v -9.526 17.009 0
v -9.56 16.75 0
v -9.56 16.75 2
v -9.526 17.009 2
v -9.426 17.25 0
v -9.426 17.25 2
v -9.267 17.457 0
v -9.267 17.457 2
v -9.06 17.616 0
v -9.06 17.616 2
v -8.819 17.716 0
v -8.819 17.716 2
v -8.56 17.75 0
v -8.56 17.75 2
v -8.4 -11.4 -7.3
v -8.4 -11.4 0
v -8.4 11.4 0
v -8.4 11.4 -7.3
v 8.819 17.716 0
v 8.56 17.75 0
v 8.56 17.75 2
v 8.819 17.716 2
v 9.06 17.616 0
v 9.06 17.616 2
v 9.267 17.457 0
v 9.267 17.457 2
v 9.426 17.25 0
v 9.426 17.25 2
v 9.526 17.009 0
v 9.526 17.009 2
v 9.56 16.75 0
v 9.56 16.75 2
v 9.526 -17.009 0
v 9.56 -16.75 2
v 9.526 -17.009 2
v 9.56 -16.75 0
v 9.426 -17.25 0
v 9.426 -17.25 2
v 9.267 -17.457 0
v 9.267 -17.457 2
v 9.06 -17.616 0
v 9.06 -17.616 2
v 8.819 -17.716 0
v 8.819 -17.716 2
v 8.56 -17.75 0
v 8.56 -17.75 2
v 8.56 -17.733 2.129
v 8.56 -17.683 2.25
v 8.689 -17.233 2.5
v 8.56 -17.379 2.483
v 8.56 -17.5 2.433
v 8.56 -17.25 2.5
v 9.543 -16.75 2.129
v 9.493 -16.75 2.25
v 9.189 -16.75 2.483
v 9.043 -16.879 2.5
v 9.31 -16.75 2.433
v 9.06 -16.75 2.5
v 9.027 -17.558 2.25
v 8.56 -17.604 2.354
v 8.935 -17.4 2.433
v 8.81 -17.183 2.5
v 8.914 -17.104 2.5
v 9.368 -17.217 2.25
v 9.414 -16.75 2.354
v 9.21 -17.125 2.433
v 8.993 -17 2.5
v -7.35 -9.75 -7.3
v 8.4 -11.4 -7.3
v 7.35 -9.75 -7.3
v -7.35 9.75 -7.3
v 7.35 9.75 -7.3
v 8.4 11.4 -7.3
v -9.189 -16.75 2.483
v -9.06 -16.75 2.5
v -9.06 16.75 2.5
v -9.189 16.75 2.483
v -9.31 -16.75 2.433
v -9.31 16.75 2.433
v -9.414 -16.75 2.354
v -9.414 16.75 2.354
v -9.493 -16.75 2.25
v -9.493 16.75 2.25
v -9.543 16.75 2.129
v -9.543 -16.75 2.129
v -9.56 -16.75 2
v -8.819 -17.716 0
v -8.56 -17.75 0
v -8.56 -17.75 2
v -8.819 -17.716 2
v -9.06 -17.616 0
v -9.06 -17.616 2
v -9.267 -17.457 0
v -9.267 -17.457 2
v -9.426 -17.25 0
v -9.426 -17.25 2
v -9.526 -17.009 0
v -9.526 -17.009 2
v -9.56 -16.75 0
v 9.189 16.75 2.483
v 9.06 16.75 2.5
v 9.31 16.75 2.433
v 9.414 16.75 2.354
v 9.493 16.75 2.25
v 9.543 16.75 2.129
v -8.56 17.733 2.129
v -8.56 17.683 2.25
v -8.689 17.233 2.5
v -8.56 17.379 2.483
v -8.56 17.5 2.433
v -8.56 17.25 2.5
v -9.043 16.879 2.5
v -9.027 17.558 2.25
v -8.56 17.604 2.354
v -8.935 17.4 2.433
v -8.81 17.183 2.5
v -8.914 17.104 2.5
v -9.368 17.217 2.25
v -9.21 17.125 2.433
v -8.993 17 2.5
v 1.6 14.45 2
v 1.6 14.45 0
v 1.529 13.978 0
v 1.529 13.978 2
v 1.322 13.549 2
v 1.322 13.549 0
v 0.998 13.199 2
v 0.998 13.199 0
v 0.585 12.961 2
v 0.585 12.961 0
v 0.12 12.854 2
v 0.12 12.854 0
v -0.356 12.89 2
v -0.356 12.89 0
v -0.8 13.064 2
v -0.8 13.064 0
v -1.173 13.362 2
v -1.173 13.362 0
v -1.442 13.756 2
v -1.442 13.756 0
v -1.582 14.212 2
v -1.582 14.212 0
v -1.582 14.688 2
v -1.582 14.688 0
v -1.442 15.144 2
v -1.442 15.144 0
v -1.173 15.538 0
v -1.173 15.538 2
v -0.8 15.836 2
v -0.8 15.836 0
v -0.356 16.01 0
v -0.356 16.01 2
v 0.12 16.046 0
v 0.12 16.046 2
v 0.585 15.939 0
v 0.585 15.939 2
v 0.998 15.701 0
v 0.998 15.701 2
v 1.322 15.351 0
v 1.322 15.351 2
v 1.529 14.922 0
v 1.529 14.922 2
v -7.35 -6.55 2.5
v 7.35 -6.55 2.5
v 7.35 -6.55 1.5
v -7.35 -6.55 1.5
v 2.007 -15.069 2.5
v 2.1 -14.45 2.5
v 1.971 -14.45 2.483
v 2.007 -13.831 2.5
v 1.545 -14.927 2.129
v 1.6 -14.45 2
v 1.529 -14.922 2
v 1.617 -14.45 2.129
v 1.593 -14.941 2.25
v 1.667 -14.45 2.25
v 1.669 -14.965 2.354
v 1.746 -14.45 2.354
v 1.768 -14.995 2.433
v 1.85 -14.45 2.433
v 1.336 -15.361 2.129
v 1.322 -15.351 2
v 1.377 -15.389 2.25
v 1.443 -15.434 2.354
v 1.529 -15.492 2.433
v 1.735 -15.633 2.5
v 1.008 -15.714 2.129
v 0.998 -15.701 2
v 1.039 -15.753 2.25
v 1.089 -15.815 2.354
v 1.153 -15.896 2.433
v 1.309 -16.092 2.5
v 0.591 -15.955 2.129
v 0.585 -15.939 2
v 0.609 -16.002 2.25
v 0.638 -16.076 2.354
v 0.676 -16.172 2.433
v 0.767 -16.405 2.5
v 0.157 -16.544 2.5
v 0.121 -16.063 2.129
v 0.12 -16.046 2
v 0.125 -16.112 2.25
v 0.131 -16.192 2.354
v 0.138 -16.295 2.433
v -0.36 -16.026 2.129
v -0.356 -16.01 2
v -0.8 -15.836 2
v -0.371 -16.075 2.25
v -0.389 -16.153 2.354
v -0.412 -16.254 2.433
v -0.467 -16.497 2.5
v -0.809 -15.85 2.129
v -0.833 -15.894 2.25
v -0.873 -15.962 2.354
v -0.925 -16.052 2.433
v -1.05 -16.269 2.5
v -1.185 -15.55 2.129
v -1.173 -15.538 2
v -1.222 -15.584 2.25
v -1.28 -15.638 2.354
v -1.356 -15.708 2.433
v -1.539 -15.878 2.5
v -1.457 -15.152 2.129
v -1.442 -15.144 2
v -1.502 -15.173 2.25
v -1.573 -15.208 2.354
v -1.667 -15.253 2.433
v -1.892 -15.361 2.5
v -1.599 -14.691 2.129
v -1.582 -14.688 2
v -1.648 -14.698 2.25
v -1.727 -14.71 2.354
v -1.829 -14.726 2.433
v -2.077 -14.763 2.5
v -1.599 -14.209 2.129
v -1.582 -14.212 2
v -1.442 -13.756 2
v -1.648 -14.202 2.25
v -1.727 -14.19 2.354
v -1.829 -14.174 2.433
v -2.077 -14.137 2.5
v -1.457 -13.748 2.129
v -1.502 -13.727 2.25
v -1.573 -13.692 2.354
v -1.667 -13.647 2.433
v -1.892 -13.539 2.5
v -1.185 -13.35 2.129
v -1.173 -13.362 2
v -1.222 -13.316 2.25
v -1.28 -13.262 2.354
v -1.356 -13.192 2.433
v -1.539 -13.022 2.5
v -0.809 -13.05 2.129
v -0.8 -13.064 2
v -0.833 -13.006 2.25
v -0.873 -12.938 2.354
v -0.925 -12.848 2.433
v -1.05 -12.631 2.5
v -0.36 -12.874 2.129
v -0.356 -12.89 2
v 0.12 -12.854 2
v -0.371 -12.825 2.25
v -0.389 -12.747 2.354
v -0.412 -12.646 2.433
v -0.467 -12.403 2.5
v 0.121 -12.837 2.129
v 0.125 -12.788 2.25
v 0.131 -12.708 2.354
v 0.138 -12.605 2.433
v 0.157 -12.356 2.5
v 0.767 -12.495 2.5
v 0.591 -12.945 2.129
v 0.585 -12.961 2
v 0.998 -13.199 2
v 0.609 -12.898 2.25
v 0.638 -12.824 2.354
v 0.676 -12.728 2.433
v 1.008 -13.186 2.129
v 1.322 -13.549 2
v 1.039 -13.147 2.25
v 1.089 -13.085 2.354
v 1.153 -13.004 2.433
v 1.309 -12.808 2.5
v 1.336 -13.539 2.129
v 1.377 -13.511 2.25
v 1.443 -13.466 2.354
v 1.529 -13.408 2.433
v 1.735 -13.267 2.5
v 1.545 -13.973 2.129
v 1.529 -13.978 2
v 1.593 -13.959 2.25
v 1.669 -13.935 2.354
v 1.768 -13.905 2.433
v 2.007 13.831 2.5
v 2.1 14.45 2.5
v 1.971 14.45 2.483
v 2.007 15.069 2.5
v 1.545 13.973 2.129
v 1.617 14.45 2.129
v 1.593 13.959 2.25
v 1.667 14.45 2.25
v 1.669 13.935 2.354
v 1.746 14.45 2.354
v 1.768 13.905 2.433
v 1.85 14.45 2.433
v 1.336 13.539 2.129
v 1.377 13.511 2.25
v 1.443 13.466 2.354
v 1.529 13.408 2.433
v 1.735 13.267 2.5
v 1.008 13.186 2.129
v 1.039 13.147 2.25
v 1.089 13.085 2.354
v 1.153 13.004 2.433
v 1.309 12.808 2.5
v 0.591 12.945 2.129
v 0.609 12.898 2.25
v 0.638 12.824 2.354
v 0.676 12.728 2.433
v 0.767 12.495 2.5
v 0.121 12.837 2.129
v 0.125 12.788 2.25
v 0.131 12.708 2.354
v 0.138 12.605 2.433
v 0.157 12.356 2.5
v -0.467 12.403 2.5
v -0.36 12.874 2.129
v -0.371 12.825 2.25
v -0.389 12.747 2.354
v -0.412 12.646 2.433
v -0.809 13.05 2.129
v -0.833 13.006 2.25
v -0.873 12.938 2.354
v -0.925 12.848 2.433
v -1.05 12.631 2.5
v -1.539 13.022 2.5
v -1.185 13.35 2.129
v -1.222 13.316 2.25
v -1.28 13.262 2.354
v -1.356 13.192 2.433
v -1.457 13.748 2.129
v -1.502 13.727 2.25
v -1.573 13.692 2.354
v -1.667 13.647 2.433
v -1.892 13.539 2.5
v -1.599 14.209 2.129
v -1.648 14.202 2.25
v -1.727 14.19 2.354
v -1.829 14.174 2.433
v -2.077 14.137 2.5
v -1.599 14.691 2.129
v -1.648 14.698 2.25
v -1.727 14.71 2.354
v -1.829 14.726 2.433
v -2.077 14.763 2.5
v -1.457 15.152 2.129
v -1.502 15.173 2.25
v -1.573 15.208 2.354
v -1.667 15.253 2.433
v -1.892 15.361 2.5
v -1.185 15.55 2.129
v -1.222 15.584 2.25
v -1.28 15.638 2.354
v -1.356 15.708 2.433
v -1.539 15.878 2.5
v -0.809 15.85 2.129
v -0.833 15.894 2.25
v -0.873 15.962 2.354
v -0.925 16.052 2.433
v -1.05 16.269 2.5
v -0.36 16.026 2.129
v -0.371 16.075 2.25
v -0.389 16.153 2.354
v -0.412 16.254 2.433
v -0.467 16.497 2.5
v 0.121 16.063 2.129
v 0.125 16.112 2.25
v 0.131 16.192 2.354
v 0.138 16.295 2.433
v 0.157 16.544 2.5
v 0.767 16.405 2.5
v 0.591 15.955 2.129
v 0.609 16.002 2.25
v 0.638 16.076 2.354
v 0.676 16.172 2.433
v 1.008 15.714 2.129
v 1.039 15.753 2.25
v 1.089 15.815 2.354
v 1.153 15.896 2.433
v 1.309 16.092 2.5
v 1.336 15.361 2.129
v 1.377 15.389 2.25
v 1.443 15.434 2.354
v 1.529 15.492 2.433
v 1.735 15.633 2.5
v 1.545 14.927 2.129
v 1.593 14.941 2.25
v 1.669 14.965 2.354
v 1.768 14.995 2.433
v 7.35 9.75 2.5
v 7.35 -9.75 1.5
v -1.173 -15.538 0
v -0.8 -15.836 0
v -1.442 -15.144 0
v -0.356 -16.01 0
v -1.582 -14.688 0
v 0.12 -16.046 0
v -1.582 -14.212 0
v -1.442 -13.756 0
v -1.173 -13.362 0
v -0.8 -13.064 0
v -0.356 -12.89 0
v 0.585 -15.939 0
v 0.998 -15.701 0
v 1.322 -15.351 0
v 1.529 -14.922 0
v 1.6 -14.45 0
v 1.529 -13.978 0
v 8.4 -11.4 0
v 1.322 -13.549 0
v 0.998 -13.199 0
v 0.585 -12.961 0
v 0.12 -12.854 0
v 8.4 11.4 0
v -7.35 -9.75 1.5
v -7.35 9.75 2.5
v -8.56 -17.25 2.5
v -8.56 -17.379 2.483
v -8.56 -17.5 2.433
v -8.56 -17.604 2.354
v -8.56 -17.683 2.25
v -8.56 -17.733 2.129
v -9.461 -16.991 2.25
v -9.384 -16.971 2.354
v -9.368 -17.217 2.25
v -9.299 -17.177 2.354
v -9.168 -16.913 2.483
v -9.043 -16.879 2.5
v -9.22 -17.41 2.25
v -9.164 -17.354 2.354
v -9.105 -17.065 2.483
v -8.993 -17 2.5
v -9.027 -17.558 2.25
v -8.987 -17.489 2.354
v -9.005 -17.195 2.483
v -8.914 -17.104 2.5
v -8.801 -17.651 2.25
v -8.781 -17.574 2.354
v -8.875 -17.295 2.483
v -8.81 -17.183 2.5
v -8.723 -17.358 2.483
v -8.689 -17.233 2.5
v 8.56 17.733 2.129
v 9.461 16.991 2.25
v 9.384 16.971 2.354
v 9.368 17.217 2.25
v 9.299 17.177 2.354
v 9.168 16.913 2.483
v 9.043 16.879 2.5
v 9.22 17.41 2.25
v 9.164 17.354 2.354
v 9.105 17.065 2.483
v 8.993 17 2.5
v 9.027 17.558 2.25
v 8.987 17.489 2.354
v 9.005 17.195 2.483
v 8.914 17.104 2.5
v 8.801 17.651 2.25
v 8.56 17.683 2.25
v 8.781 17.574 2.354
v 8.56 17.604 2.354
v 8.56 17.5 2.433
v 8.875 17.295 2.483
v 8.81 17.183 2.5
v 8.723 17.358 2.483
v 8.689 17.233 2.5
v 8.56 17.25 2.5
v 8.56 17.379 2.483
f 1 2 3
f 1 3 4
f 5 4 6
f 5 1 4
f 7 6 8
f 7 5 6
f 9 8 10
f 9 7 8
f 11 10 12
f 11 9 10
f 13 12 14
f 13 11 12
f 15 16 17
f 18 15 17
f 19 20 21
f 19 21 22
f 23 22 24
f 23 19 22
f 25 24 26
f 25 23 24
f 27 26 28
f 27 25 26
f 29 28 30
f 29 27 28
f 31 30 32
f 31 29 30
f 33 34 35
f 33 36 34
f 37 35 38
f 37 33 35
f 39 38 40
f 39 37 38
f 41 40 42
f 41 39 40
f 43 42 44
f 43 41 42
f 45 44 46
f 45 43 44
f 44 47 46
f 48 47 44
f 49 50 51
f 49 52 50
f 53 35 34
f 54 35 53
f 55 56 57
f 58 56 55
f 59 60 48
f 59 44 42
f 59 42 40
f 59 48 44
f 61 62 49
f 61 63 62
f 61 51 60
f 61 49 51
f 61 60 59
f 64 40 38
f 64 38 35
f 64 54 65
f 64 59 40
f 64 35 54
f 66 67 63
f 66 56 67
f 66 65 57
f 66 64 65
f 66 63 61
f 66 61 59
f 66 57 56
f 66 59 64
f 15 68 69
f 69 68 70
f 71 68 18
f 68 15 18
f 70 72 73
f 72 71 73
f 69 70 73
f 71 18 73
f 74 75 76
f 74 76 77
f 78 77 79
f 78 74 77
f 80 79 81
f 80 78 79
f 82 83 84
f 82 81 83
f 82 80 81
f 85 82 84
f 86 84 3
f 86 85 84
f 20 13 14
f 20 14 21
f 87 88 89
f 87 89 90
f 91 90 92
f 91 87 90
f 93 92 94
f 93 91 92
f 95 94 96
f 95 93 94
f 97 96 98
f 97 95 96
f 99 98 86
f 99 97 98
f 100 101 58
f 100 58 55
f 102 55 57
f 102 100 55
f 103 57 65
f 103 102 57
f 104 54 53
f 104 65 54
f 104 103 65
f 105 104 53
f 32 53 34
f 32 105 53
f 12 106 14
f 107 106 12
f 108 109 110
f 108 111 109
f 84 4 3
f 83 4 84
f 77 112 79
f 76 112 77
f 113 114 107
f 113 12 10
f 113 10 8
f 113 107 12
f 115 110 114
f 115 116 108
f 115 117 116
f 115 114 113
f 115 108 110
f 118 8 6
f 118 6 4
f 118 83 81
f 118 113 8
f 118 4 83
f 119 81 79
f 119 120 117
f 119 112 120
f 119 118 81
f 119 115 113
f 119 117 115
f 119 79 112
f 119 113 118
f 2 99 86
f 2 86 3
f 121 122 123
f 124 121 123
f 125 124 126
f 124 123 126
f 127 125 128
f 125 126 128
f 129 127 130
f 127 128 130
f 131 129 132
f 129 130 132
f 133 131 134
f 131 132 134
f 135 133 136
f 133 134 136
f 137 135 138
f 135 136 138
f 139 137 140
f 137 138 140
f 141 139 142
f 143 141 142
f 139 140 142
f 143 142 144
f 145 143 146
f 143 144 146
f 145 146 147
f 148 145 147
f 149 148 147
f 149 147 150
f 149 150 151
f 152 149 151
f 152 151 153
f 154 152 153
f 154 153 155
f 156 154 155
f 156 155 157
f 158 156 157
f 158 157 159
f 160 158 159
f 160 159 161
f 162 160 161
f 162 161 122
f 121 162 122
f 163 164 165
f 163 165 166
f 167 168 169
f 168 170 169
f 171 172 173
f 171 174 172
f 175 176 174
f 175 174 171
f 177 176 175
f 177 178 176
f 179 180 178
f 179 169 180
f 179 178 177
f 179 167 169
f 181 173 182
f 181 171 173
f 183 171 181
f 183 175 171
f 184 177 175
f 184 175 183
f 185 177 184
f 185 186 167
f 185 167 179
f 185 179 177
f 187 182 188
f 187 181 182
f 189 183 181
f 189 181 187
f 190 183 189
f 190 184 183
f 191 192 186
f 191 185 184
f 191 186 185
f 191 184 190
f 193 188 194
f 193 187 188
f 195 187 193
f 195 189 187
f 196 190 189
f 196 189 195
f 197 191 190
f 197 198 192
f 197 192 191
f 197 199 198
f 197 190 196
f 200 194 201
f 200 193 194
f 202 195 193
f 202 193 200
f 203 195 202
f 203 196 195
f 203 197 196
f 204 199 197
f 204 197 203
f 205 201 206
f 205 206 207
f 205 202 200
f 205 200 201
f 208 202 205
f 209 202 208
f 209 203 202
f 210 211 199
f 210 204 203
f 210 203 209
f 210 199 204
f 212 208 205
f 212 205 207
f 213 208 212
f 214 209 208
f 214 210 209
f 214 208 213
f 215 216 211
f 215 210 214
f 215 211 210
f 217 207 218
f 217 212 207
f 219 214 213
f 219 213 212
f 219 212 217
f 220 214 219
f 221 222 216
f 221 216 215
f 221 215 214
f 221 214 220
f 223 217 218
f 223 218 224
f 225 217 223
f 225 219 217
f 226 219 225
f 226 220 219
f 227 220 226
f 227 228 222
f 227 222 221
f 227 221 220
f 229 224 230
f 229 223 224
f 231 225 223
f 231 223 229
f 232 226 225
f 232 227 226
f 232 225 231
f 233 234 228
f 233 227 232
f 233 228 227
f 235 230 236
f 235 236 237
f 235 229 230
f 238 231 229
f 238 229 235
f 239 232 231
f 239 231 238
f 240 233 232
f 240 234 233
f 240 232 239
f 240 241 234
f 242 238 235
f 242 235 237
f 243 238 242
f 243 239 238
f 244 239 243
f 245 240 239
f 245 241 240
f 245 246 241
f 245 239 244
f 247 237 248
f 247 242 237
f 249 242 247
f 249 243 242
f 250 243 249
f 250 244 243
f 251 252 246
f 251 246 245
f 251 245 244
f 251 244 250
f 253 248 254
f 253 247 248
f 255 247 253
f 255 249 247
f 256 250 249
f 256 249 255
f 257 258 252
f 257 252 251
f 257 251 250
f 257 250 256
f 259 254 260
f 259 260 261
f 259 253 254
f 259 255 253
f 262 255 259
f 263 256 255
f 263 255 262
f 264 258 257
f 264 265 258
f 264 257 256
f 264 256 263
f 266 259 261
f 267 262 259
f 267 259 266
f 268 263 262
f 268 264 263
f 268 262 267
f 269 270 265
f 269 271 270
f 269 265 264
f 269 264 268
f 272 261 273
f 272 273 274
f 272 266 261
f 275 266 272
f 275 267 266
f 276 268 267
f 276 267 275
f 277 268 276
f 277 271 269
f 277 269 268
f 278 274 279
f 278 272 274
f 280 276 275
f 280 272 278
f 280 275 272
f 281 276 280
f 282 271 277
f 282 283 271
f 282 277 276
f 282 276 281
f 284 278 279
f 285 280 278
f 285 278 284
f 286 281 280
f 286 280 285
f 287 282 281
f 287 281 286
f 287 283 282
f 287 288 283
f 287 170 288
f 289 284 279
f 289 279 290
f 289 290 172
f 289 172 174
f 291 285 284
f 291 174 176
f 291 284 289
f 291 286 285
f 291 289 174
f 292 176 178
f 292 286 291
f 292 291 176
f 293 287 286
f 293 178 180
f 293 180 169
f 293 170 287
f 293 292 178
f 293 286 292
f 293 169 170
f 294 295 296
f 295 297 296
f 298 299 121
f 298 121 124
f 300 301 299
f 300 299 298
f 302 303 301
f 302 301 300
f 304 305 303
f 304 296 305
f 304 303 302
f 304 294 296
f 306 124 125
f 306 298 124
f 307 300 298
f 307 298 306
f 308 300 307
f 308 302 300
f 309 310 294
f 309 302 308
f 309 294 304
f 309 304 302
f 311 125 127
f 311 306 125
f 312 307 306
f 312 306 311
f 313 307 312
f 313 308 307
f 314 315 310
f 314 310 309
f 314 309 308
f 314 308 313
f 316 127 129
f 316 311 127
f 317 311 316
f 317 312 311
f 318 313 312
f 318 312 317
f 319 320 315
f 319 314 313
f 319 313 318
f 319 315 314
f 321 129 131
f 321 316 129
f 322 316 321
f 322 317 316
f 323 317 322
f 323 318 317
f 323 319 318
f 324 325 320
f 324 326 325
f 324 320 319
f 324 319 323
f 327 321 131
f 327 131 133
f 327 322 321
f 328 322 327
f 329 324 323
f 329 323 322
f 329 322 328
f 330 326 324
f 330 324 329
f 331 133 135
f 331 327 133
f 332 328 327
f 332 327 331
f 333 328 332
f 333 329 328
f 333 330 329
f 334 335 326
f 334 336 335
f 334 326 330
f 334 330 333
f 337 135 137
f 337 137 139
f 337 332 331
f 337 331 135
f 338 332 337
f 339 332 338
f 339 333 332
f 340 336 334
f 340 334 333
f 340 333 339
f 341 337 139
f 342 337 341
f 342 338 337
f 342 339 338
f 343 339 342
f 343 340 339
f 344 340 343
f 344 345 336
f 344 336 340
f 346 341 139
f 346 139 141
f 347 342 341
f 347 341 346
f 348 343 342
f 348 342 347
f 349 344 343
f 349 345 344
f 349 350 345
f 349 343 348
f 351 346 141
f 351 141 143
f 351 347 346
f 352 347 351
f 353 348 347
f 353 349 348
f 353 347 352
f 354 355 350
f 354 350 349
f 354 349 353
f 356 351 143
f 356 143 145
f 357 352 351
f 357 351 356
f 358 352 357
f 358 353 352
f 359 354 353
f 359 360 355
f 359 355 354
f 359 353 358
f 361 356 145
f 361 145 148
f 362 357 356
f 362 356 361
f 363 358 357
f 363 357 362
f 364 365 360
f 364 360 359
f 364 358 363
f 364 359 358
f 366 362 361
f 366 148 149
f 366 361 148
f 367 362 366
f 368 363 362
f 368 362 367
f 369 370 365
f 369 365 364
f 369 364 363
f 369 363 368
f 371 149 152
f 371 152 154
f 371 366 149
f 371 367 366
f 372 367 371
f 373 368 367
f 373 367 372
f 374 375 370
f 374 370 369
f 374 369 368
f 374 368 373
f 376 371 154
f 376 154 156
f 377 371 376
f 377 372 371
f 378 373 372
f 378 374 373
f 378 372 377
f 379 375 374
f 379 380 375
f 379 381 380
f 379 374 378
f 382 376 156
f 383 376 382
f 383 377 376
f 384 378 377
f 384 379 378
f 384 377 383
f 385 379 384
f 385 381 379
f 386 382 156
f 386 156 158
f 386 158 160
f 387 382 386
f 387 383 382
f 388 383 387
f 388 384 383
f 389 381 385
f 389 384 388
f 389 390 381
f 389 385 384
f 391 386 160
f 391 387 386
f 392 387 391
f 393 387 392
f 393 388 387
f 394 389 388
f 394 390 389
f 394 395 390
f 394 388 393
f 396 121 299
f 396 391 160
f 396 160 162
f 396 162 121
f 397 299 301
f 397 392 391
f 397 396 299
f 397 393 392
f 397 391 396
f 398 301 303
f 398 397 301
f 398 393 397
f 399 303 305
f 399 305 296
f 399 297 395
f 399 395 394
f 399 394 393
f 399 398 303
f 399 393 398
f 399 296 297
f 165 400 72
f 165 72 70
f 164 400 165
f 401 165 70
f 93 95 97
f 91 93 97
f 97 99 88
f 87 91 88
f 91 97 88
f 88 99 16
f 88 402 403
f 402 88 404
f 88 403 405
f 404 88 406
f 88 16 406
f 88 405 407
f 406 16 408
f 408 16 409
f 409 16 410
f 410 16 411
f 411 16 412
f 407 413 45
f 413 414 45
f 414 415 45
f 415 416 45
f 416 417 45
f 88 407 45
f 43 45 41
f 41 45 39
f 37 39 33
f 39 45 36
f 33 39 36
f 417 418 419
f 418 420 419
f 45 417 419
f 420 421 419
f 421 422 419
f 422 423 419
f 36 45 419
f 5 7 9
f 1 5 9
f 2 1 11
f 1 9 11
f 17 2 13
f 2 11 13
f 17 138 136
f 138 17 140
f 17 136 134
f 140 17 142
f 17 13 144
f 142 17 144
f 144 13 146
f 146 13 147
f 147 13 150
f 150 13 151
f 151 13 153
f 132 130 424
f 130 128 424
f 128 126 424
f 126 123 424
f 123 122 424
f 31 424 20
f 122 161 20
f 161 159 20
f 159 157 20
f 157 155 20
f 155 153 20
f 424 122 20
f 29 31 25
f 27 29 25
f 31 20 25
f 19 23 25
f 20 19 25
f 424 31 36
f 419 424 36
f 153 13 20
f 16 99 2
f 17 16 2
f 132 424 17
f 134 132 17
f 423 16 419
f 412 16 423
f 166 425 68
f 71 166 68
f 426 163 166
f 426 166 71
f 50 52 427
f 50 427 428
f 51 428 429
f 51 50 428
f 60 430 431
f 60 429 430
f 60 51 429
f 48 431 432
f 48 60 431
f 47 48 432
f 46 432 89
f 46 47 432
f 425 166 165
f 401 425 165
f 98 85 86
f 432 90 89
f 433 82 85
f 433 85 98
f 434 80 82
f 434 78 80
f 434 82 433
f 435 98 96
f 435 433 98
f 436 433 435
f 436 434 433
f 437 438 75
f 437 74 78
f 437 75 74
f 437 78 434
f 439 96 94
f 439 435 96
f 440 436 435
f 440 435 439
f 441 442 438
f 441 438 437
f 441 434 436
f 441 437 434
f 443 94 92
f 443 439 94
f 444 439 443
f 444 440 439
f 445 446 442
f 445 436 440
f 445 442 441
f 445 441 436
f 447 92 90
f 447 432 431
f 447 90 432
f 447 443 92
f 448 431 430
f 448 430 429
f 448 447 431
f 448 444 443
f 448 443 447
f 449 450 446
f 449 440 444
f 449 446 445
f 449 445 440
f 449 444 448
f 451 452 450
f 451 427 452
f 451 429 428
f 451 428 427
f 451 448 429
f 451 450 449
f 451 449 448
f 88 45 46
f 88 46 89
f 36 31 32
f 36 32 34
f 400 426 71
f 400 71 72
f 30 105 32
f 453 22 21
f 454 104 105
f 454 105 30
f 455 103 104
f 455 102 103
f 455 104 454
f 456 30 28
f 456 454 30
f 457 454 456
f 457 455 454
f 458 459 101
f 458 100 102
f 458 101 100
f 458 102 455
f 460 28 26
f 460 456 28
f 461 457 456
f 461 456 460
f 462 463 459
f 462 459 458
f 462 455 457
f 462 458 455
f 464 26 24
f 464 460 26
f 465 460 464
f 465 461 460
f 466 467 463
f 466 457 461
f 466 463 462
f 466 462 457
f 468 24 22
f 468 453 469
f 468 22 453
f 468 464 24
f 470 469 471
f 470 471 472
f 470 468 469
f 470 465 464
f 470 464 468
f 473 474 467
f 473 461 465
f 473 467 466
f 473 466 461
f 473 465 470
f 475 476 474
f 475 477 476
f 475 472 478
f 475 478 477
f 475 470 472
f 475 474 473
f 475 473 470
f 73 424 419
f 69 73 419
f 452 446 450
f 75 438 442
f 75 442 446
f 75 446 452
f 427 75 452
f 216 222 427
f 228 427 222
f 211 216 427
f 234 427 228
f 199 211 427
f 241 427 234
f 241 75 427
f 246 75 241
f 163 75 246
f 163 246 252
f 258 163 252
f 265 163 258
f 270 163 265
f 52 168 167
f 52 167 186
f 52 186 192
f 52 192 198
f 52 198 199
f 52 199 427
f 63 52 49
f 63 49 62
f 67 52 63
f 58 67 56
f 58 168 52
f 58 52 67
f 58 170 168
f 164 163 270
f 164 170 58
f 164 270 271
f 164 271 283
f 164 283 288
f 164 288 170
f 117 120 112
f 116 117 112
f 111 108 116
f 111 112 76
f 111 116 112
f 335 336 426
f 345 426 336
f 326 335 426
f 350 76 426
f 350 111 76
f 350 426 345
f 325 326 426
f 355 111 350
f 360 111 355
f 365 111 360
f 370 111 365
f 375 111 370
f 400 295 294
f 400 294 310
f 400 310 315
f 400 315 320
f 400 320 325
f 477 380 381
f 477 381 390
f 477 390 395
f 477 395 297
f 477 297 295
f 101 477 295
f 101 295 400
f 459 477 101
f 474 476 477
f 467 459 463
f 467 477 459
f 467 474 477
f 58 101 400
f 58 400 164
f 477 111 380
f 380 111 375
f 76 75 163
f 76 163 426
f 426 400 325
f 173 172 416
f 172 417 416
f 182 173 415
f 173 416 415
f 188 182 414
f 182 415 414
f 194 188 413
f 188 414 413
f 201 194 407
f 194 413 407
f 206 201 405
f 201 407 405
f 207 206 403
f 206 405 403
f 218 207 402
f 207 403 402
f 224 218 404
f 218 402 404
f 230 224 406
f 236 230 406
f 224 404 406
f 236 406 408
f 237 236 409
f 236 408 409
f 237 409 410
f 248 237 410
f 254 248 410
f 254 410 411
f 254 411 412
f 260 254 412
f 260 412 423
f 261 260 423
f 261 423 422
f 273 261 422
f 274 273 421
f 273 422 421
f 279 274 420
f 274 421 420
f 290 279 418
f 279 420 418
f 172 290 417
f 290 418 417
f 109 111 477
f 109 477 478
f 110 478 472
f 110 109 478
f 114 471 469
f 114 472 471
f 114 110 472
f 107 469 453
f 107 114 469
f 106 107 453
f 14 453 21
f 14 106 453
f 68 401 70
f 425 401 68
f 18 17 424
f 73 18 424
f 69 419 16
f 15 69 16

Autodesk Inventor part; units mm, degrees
ref_plane "YZ Plane" through (0, 0, 0) normal (1, 0, 0) x (0, 1, 0)
ref_plane "XZ Plane" through (0, 0, 0) normal (0, 1, 0) x (-1, 0, 0)
ref_plane "XY Plane" through (0, 0, 0) normal (0, 0, 1) x (1, 0, 0)
sketch "Skizze1" plane through (0, 0, 0) normal (0, 0, 1) x (1, 0, 0)
  line L0 (-8.4, 11.4) -> (8.4, 11.4)
  line L1 (8.4, 11.4) -> (8.4, -11.4)
  line L2 (8.4, -11.4) -> (-8.4, -11.4)
  line L3 (-8.4, -11.4) -> (-8.4, 11.4)
  line L4 (-13.6739, 0) -> (13.6739, 0) projected
  line L5 (0, -25.1399) -> (0, 25.1399) projected
  line L6 (-7.35, 9.75) -> (7.35, 9.75)
  line L7 (7.35, 9.75) -> (7.35, -9.75)
  line L8 (7.35, -9.75) -> (-7.35, -9.75)
  line L9 (-7.35, -9.75) -> (-7.35, 9.75)
  line L10 (-8.56, 17.75) -> (8.56, 17.75)
  line L11 (9.56, 16.75) -> (9.56, -16.75)
  line L12 (8.56, -17.75) -> (-8.56, -17.75)
  line L13 (-9.56, -16.75) -> (-9.56, 16.75)
  circle A0 centre (0, 14.45) radius 1.6
  line L14 (-9.56, -17.75) -> (9.56, -17.75)
  circle A1 centre (0, -14.45) radius 1.6
  arc A2 (-8.56, 17.75) -> (-9.56, 16.75) centre (-8.56, 16.75) ccw
  arc A3 (9.56, 16.75) -> (8.56, 17.75) centre (8.56, 16.75) ccw
  arc A4 (8.56, -17.75) -> (9.56, -16.75) centre (8.56, -16.75) ccw
  arc A5 (-9.56, -16.75) -> (-8.56, -17.75) centre (-8.56, -16.75) ccw
  line L15 (7.35, -6.55) -> (-7.35, -6.55)
  point P0 (0, 0)
  point P1 (-9.56, 17.75)
  point P2 (9.56, 17.75)
  dimension "d0" = 16.8
  dimension "d1" = 22.8
  dimension "d2" = 19.5
  dimension "d3" = 14.7
  dimension "d4" = 35.5
  dimension "d5" = 19.12
  dimension "d6" = 3.2
  dimension "d7" = 28.9
  dimension "d8" = 1
  dimension "d14" = 3.2
extrude "Extrusion1" add sketch "Skizze1" against normal blind 7.3 contours L0 L5 L6 L9 L4 L3 | L0 L1 L4 L7 L6 L5 | L4 L9 L8 L5 L2 L3 | L1 L2 L5 L8 L7 L4
extrude "Extrusion2" add sketch "Skizze1" along normal blind 2.5 contours L3 L4 L13 A2 L10 L5 A0 L0 | L0 L5 L6 L9 L4 L3 | L5 A0 L10 A3 L11 L4 L1 L0 | L0 L1 L4 L7 L6 L5 | L4 L9 L8 L5 L2 L3 | L3 L2 L5 A1 L12 A5 L13 L4 | L4 L11 A4 L12 L5 A1 L2 L1 | L1 L2 L5 L8 L7 L4
extrude "Extrusion3" add sketch "Skizze1" against normal blind 1 from surface at 2.5 contours L15 L5 L8 L9 | L15 L7 L8 L5
fillet "Rundung1" radius 0.5 10 edges at (-9.2671, 17.4571, 2.5) (-9.56, 0, 2.5) (-9.2671, -17.4571, 2.5) (0, -17.75, 2.5) (9.2671, -17.4571, 2.5) (9.56, 0, 2.5) (9.2671, 17.4571, 2.5) (0, 17.75, 2.5) (-1.6, 14.45, 2.5) (-1.6, -14.45, 2.5)
properties part number "Delock_86213_Grob"
